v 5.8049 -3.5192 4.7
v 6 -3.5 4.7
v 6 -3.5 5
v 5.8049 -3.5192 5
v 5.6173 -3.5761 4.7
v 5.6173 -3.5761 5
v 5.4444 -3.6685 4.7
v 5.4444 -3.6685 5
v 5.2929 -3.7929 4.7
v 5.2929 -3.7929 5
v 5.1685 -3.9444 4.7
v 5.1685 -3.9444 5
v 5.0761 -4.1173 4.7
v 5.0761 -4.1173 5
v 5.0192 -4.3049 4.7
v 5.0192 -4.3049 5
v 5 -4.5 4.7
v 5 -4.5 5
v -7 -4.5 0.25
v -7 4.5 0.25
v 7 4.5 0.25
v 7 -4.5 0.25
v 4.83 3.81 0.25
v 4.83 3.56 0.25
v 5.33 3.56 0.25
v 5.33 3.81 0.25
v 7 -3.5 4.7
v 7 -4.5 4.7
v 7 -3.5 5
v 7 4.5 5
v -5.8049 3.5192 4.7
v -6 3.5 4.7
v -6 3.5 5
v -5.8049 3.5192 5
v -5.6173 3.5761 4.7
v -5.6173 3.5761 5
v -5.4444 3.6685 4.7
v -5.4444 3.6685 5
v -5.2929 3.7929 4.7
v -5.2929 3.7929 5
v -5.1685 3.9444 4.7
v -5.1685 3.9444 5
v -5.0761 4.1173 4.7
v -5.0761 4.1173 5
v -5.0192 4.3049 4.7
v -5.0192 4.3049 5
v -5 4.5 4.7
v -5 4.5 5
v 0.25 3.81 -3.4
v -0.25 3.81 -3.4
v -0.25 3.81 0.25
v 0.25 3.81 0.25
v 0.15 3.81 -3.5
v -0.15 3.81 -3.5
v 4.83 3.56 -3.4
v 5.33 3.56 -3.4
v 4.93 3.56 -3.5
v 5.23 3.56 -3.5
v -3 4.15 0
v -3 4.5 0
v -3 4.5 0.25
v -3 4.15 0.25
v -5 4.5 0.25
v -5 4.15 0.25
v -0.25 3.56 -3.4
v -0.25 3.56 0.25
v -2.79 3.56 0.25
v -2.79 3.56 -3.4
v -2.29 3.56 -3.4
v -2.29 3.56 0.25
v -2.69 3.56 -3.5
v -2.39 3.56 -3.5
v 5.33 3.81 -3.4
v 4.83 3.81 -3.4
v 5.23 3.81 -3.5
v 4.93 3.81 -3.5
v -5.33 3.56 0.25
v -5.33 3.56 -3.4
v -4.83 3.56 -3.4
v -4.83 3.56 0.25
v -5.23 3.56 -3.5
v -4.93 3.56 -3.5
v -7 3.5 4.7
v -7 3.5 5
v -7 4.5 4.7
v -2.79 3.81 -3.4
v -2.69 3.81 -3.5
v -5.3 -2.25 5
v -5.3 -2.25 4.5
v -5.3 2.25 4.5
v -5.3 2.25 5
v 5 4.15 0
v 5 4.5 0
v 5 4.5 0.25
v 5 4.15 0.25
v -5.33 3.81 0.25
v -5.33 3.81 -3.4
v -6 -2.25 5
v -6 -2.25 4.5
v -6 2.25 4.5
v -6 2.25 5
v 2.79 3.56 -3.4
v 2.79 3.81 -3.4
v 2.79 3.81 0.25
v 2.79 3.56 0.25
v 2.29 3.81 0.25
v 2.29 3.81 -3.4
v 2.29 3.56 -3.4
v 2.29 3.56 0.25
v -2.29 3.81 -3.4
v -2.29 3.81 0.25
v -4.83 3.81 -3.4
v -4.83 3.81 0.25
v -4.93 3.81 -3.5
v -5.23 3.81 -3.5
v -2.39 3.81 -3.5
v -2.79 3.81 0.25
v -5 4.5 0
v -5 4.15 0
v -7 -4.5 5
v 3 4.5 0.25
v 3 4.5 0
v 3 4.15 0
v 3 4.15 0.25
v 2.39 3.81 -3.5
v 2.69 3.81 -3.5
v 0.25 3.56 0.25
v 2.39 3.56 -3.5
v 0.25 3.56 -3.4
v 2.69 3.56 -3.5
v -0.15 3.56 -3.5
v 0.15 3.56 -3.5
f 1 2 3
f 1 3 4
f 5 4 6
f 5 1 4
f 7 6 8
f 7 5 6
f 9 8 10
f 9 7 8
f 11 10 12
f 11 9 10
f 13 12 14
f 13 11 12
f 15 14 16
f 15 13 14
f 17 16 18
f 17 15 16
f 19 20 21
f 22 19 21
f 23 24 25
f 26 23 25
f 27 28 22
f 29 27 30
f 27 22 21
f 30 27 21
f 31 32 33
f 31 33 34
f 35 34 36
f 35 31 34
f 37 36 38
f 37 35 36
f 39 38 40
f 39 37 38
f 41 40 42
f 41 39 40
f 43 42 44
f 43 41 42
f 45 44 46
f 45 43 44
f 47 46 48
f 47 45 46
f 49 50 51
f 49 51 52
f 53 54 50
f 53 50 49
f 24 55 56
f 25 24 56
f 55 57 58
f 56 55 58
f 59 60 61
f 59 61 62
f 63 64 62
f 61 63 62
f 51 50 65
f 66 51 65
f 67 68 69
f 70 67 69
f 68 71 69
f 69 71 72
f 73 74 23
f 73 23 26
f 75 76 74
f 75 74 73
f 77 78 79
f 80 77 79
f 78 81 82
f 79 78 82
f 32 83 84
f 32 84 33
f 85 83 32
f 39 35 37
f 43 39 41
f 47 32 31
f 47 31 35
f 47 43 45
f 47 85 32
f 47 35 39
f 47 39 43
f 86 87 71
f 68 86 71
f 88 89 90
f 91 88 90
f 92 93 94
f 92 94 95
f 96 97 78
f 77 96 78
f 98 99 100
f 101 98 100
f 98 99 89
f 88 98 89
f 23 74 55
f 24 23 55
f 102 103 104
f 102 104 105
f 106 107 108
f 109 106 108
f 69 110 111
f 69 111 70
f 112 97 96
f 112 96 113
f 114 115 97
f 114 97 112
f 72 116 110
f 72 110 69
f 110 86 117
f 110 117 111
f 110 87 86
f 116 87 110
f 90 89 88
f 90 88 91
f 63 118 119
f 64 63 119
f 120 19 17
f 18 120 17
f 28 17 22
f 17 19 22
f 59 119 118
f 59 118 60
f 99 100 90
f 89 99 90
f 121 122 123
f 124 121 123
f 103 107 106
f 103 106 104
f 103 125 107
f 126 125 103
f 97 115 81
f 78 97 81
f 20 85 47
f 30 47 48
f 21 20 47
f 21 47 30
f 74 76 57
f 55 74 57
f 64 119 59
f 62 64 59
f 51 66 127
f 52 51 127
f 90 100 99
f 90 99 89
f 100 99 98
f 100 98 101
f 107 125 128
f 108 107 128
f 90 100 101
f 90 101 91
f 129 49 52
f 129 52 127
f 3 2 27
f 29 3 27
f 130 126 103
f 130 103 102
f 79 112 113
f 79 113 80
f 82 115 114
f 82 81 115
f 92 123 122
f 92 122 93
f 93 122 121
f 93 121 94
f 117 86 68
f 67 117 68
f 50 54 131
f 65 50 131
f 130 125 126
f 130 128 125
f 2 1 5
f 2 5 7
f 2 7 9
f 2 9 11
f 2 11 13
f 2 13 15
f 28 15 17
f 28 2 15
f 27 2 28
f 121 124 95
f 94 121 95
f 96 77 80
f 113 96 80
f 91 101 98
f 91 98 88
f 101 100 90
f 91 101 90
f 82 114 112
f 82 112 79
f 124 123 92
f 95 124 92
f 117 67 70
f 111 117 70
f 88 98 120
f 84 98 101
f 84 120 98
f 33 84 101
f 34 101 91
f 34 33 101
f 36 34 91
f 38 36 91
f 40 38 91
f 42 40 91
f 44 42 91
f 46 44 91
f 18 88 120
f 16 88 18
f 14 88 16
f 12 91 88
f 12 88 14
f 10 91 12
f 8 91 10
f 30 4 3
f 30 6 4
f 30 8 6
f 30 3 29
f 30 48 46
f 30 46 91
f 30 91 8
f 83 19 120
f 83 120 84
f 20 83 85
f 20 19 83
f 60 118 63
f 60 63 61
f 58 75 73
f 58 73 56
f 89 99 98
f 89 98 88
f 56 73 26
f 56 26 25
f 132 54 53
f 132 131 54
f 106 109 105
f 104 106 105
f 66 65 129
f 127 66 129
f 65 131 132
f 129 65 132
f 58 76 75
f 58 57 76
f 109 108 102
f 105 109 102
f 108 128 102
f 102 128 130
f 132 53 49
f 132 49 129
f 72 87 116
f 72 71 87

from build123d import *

# Parameters (mm, degrees)
BOX001_W          = 0.7
BOX001_H          = 4.5
BOX001_DEPTH      = 0.5
CYLINDER_R        = 1
CYLINDER_DEPTH    = 0.3
BOX003_W          = 1
BOX003_H          = 1
BOX003_DEPTH      = 0.3
CYLINDER001_R     = 1
CYLINDER001_DEPTH = 0.3
BOX004_W          = 1
BOX004_H          = 1
BOX004_DEPTH      = 0.3
BOX002_W          = 0.7
BOX002_H          = 4.5
BOX002_DEPTH      = 0.5
BOX_W             = 14
BOX_H             = 9
BOX_DEPTH         = 4.75
BOX006_W          = 0.5
BOX006_H          = 0.25
BOX006_DEPTH      = 3.75
CHAMFER_SIZE      = 0.1
CHAMFER001_SIZE   = 0.1
CHAMFER002_SIZE   = 0.1
CHAMFER003_SIZE   = 0.1
CHAMFER004_SIZE   = 0.1
BOX007_W          = 2
BOX007_H          = 0.35
BOX007_DEPTH      = 0.25
BOX005_W          = 2
BOX005_H          = 0.35
BOX005_DEPTH      = 0.25


with BuildPart() as cube001:
    # Box001 → Box001 (new body)
    with BuildSketch(Plane(origin=(-6, -2.25, 4.5), x_dir=(1, 0, 0), z_dir=(0, 0, 1))):
        with Locations((0.35, 2.25)):
            Rectangle(BOX001_W, BOX001_H)
    extrude(amount=BOX001_DEPTH)


with BuildPart() as cylinder:
    # Cylinder → Cylinder (new body)
    with BuildSketch(Plane(origin=(6, -4.5, 4.7), x_dir=(1, 0, 0), z_dir=(0, 0, 1))):
        Circle(CYLINDER_R)
    extrude(amount=CYLINDER_DEPTH)


with BuildPart() as cube003:
    # Box003 → Box003 (new body)
    with BuildSketch(Plane(origin=(6, -4.5, 4.7), x_dir=(1, 0, 0), z_dir=(0, 0, 1))):
        with Locations((0.5, 0.5)):
            Rectangle(BOX003_W, BOX003_H)
    extrude(amount=BOX003_DEPTH)


with BuildPart() as cylinder001:
    # Cylinder001 → Cylinder001 (new body)
    with BuildSketch(Plane(origin=(-6, 4.5, 4.7), x_dir=(1, 0, 0), z_dir=(0, 0, 1))):
        Circle(CYLINDER001_R)
    extrude(amount=CYLINDER001_DEPTH)


with BuildPart() as cube004:
    # Box004 → Box004 (new body)
    with BuildSketch(Plane(origin=(-7, 3.5, 4.7), x_dir=(1, 0, 0), z_dir=(0, 0, 1))):
        with Locations((0.5, 0.5)):
            Rectangle(BOX004_W, BOX004_H)
    extrude(amount=BOX004_DEPTH)


with BuildPart() as cube002:
    # Box002 → Box002 (new body)
    with BuildSketch(Plane(origin=(-6, -2.25, 4.5), x_dir=(1, 0, 0), z_dir=(0, 0, 1))):
        with Locations((0.35, 2.25)):
            Rectangle(BOX002_W, BOX002_H)
    extrude(amount=BOX002_DEPTH)


with BuildPart() as cut004:
    # Box → Box (new body)
    with BuildSketch(Plane(origin=(-7, -4.5, 0.25), x_dir=(1, 0, 0), z_dir=(0, 0, 1))):
        with Locations((7, 4.5)):
            Rectangle(BOX_W, BOX_H)
    extrude(amount=BOX_DEPTH)

    # Cut: cut Cube002
    add(cube002.part, mode=Mode.SUBTRACT)

    # Cut001: cut Cube004
    add(cube004.part, mode=Mode.SUBTRACT)

    # Cut002: cut Cylinder001
    add(cylinder001.part, mode=Mode.SUBTRACT)

    # Cut003: cut Cube003
    add(cube003.part, mode=Mode.SUBTRACT)

    # Cut004: cut Cylinder
    add(cylinder.part, mode=Mode.SUBTRACT)


with BuildPart() as cube006:
    # Box006 → Box006 (new body)
    with BuildSketch(Plane(origin=(-0.25, -3.81, -3.5), x_dir=(1, 0, 0), z_dir=(0, 0, 1))):
        with Locations((0.25, 0.125)):
            Rectangle(BOX006_W, BOX006_H)
    extrude(amount=BOX006_DEPTH)


with BuildPart() as pin3:
    # Chamfer base: copy of Cube006
    add(cube006.part)

    # Chamfer
    chamfer_edges = [pin3.edges().sort_by_distance(p)[0] for p in [
        (-0.25, -3.685, -3.5),
        (0.25, -3.685, -3.5),
    ]]
    chamfer(chamfer_edges, length=CHAMFER_SIZE)


with BuildPart() as part_mirroring:
    # Part__Mirroring: instance of pin3
    add(pin3.part.mirror(Plane(origin=(0, 0, -1.625), x_dir=(1, 0, 0), z_dir=(0, 1, 0))))


with BuildPart() as pin4:
    # Chamfer001 base: copy of Cube006
    add(cube006.part)

    # Chamfer001
    chamfer001_edges = [pin4.edges().sort_by_distance(p)[0] for p in [
        (-0.25, -3.685, -3.5),
        (0.25, -3.685, -3.5),
    ]]
    chamfer(chamfer001_edges, length=CHAMFER001_SIZE)


with BuildPart() as pin4_1:
    # Chamfer001 placement: moved
    add(pin4.part.moved(Location((2.54, 0, 0))))


with BuildPart() as part_mirroring001:
    # Part__Mirroring001: instance of pin4
    add(pin4_1.part.mirror(Plane(origin=(2.54, 0, -1.625), x_dir=(1, 0, 0), z_dir=(0, 1, 0))))


with BuildPart() as pin5:
    # Chamfer002 base: copy of Cube006
    add(cube006.part)

    # Chamfer002
    chamfer002_edges = [pin5.edges().sort_by_distance(p)[0] for p in [
        (-0.25, -3.685, -3.5),
        (0.25, -3.685, -3.5),
    ]]
    chamfer(chamfer002_edges, length=CHAMFER002_SIZE)


with BuildPart() as pin5_1:
    # Chamfer002 placement: moved
    add(pin5.part.moved(Location((5.08, 0, 0))))


with BuildPart() as part_mirroring002:
    # Part__Mirroring002: instance of pin5
    add(pin5_1.part.mirror(Plane(origin=(5.08, 0, -1.625), x_dir=(1, 0, 0), z_dir=(0, 1, 0))))


with BuildPart() as pin2:
    # Chamfer003 base: copy of Cube006
    add(cube006.part)

    # Chamfer003
    chamfer003_edges = [pin2.edges().sort_by_distance(p)[0] for p in [
        (-0.25, -3.685, -3.5),
        (0.25, -3.685, -3.5),
    ]]
    chamfer(chamfer003_edges, length=CHAMFER003_SIZE)


with BuildPart() as pin2_1:
    # Chamfer003 placement: moved
    add(pin2.part.moved(Location((-2.54, 0, 0))))


with BuildPart() as part_mirroring003:
    # Part__Mirroring003: instance of pin2
    add(pin2_1.part.mirror(Plane(origin=(0, 0, 0), x_dir=(1, 0, 0), z_dir=(0, 1, 0))))


with BuildPart() as pin1:
    # Chamfer004 base: copy of Cube006
    add(cube006.part)

    # Chamfer004
    chamfer004_edges = [pin1.edges().sort_by_distance(p)[0] for p in [
        (-0.25, -3.685, -3.5),
        (0.25, -3.685, -3.5),
    ]]
    chamfer(chamfer004_edges, length=CHAMFER004_SIZE)


with BuildPart() as pin1_1:
    # Chamfer004 placement: moved
    add(pin1.part.moved(Location((-5.08, 0, 0))))


with BuildPart() as part_mirroring004:
    # Part__Mirroring004: instance of pin1
    add(pin1_1.part.mirror(Plane(origin=(0, 0, 0), x_dir=(1, 0, 0), z_dir=(0, 1, 0))))


with BuildPart() as sup1:
    # Box007 → Box007 (new body)
    with BuildSketch(Plane(origin=(-5, -4.5, 0), x_dir=(1, 0, 0), z_dir=(0, 0, 1))):
        with Locations((1, 0.175)):
            Rectangle(BOX007_W, BOX007_H)
    extrude(amount=BOX007_DEPTH)


with BuildPart() as part_mirroring005:
    # Part__Mirroring005: instance of sup1
    add(sup1.part.mirror(Plane(origin=(0, 0, 0), x_dir=(1, 0, 0), z_dir=(0, 1, 0))))


with BuildPart() as sup2:
    # Box005 → Box005 (new body)
    with BuildSketch(Plane(origin=(3, -4.5, 0), x_dir=(1, 0, 0), z_dir=(0, 0, 1))):
        with Locations((1, 0.175)):
            Rectangle(BOX005_W, BOX005_H)
    extrude(amount=BOX005_DEPTH)


with BuildPart() as part_mirroring006:
    # Part__Mirroring006: instance of sup2
    add(sup2.part.mirror(Plane(origin=(0, 0, 0), x_dir=(1, 0, 0), z_dir=(0, 1, 0))))


solid = Compound([cube001.part, cut004.part, part_mirroring.part, part_mirroring001.part, part_mirroring002.part, part_mirroring003.part, part_mirroring004.part, part_mirroring005.part, part_mirroring006.part])
